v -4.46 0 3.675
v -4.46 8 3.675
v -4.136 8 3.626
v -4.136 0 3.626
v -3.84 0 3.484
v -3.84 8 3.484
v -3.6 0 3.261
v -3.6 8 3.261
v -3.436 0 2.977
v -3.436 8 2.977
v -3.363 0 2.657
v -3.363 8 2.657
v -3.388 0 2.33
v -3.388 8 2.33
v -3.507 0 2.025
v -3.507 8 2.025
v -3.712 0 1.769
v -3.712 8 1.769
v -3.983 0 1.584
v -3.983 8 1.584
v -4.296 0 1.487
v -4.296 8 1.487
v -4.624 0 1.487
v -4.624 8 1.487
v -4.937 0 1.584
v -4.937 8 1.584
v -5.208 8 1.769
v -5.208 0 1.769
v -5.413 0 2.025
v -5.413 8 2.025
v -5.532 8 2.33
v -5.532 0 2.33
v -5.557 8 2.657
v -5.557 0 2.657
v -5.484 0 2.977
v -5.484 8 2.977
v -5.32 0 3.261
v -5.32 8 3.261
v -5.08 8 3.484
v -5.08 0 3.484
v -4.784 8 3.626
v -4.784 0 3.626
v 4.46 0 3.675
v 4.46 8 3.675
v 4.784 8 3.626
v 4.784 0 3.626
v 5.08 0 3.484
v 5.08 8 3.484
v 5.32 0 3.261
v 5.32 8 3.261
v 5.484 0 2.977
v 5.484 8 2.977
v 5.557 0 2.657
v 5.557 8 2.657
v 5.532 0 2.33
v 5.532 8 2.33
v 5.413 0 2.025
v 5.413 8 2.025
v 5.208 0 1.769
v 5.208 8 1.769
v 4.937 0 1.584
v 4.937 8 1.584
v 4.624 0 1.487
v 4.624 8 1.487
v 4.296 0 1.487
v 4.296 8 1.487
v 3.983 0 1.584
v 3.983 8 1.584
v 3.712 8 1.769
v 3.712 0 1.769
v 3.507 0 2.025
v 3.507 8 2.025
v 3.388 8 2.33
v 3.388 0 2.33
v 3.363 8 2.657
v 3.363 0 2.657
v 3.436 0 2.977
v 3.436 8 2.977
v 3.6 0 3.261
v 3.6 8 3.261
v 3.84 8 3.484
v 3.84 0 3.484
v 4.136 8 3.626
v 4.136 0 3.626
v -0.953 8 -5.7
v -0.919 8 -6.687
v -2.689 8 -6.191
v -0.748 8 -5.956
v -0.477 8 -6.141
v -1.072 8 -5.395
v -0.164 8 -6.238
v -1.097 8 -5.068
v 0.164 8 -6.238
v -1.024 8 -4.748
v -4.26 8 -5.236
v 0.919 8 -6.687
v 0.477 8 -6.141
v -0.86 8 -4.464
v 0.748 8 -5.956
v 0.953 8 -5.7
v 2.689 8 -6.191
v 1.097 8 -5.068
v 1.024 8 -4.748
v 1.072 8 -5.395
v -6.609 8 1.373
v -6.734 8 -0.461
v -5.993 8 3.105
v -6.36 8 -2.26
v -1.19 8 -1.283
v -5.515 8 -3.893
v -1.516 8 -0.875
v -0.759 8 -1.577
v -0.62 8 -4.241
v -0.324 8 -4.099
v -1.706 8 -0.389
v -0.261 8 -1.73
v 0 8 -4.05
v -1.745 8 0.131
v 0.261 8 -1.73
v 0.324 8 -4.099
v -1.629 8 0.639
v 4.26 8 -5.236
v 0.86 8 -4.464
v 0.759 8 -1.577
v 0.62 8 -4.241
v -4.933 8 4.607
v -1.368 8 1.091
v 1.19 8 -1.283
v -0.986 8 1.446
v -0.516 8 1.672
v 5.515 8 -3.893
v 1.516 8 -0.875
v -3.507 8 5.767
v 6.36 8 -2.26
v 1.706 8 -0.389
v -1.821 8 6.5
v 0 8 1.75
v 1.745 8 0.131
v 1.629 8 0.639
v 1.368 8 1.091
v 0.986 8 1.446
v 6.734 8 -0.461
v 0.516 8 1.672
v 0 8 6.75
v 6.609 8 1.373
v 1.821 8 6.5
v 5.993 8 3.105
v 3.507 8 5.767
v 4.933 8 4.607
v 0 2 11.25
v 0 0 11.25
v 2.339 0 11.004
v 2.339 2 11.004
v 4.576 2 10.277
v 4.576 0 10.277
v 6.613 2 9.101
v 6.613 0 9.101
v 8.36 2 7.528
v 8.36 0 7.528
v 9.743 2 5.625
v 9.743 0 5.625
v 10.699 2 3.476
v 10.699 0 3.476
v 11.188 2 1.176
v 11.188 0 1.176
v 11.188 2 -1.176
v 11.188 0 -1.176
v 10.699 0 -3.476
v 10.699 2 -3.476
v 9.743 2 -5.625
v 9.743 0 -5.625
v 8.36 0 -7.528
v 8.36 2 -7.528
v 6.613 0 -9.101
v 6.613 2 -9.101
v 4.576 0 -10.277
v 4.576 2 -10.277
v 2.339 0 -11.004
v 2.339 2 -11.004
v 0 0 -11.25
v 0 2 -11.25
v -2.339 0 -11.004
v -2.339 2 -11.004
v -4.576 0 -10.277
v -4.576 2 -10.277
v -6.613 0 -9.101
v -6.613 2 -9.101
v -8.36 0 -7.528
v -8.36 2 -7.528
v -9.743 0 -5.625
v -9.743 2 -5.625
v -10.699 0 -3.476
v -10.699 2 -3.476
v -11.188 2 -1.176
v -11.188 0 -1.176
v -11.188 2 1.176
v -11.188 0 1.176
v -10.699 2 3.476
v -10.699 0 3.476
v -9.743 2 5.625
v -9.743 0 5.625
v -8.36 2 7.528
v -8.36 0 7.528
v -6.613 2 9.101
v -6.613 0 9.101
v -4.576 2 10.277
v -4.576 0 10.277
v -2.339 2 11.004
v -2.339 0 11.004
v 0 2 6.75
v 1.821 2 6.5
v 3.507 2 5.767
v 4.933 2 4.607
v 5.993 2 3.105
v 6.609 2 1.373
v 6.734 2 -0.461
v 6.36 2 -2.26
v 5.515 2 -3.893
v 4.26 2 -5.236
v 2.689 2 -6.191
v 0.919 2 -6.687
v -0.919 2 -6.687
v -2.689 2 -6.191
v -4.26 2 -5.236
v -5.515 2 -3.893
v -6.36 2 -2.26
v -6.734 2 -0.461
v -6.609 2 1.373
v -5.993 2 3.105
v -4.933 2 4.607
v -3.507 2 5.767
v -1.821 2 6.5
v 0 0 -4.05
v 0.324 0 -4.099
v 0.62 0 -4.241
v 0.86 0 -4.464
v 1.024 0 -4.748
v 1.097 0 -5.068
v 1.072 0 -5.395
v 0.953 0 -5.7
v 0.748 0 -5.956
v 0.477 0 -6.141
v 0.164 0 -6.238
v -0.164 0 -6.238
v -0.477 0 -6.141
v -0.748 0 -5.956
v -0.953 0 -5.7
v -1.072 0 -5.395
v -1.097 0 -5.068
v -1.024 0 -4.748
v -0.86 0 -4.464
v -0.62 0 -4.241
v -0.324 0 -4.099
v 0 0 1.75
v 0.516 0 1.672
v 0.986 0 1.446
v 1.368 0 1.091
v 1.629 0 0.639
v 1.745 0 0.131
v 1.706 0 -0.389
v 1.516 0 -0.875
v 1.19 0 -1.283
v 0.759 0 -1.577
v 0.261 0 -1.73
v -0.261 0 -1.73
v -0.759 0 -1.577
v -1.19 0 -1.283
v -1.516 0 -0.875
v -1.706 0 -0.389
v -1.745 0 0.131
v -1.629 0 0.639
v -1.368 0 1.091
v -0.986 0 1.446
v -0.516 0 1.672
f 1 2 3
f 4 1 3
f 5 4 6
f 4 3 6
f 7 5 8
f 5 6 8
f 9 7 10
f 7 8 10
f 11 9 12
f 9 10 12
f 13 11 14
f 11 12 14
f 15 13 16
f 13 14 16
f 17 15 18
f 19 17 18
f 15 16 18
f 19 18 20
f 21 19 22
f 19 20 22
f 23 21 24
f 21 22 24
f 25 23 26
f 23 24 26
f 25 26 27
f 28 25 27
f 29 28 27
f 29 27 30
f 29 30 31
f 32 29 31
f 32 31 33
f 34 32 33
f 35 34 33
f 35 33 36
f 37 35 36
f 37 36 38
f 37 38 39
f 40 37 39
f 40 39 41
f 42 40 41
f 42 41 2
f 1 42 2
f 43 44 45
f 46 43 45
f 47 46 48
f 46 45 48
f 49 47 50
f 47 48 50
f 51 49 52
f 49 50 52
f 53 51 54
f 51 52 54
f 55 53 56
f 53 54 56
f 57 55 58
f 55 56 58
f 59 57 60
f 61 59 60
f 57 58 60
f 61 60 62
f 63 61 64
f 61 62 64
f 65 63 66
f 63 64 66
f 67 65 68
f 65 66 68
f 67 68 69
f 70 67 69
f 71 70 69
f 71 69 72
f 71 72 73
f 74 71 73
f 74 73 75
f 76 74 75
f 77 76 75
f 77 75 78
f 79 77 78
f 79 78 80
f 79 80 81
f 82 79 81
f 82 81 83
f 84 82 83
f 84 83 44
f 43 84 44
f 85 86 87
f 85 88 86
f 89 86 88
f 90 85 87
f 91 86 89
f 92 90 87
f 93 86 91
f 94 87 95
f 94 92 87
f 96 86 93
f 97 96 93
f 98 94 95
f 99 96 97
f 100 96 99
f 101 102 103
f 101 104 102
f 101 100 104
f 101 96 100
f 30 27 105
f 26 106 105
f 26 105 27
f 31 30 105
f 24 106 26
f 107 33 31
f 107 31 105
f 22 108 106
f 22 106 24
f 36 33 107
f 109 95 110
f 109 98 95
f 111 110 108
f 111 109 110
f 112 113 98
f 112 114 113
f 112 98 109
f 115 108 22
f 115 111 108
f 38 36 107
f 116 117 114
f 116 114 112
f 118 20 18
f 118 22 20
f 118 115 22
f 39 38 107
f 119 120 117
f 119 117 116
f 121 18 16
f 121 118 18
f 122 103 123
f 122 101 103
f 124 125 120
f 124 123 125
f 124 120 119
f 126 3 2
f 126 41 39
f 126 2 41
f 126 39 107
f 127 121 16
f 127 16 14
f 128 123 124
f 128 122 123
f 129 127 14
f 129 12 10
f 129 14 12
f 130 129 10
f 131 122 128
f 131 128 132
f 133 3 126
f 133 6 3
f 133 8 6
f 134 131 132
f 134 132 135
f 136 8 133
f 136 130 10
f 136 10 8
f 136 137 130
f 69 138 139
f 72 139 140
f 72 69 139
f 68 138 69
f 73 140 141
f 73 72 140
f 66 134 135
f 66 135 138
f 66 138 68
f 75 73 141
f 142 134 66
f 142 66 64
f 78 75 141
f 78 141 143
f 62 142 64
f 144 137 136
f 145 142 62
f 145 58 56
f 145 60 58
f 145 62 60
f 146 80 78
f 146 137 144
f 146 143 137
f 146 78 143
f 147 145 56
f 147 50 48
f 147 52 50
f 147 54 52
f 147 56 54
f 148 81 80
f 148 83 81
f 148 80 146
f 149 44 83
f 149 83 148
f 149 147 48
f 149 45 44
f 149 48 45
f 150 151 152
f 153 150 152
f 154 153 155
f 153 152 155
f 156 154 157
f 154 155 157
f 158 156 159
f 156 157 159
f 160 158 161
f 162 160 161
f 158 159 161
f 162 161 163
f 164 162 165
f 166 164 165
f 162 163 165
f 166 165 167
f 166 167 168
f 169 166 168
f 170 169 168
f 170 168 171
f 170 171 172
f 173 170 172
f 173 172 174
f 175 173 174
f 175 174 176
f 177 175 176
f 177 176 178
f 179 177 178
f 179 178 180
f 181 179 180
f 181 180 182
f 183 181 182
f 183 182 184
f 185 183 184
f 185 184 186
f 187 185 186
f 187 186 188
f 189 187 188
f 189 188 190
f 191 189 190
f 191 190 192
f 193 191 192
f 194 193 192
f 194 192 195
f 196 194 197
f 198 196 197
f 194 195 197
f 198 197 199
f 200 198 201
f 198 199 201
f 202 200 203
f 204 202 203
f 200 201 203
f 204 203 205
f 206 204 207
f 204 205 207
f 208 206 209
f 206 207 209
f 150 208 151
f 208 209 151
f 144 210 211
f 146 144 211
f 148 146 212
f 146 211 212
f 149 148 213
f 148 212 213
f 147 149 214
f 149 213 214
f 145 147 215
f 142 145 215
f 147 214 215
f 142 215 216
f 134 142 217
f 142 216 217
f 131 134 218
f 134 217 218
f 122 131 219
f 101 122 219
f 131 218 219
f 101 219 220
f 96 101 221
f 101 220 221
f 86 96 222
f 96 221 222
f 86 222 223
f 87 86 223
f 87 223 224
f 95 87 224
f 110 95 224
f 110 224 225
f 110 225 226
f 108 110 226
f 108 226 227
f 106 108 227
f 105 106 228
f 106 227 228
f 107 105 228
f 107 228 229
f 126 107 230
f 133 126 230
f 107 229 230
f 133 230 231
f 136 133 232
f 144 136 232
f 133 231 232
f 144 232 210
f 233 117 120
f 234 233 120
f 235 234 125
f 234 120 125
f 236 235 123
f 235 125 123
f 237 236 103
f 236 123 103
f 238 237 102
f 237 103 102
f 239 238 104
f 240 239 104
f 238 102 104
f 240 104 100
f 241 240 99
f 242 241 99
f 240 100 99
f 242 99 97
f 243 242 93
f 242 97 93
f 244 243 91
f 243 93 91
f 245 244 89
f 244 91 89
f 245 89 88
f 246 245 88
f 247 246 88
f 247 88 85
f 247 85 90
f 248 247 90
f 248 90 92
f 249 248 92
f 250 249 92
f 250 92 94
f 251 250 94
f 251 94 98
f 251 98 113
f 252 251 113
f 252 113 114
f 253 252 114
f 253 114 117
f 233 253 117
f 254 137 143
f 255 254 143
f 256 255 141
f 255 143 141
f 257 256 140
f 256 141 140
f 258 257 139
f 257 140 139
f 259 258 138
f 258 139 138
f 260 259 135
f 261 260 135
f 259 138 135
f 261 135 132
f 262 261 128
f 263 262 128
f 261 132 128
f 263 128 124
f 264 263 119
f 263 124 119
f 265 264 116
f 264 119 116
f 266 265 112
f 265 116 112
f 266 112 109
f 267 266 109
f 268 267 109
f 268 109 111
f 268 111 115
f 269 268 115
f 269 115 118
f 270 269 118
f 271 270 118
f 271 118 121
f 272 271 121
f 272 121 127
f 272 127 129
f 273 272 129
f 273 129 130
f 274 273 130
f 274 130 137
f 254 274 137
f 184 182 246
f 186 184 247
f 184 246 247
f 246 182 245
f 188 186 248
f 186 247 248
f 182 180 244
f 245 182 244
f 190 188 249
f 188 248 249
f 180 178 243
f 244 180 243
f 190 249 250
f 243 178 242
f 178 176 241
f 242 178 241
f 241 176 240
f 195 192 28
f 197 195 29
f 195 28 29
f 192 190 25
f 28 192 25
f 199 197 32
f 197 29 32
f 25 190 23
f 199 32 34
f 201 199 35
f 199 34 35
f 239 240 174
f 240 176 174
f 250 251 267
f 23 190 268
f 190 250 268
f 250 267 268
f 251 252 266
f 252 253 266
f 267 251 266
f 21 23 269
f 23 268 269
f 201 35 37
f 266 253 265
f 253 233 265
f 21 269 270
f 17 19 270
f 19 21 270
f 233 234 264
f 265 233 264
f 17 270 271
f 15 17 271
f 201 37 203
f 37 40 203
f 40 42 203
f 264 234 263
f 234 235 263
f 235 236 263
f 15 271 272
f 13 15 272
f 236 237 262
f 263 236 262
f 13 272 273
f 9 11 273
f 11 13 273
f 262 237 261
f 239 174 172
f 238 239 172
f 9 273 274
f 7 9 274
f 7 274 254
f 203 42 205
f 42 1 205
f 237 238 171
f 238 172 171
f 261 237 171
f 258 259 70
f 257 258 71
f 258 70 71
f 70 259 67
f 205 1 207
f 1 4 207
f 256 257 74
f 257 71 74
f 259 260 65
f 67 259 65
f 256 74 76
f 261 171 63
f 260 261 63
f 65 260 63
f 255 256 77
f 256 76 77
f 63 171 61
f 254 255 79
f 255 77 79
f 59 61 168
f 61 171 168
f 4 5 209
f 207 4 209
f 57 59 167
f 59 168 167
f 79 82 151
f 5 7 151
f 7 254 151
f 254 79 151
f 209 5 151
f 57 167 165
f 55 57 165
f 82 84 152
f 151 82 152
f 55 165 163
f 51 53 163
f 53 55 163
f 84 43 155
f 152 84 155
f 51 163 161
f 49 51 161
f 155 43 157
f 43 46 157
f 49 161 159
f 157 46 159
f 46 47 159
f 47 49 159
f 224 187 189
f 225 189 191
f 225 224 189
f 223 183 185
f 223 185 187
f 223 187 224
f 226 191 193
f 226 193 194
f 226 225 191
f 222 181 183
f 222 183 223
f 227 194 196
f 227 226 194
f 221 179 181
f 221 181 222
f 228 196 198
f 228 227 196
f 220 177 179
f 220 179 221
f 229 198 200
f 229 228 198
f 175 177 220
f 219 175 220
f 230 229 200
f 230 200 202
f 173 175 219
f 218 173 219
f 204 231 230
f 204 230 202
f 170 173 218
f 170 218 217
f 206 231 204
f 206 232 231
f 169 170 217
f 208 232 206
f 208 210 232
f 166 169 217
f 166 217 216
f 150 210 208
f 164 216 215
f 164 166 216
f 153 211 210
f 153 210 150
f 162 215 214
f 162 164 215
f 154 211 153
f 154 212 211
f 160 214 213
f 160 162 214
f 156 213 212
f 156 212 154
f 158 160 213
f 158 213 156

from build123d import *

# Parameters (mm, degrees)
SKETCH_1_R          = 11.25
EXTRUDE_1_DEPTH     = 8
CUT_EXTRUDE_START   = -6
SKETCH_3_R          = 11.25
SKETCH_3_R_2        = 6.75
CUT_EXTRUDE_1_DEPTH = 6
SKETCH_4_R          = 1.75
SKETCH_4_R_2        = 1.1
CUT_EXTRUDE_2_DEPTH = 18.808003819


with BuildPart() as part:
    # 草图1 → 凸台-拉伸1 (new body)
    with BuildSketch(Plane(origin=(0, 0, 0), x_dir=(1, 0, 0), z_dir=(0, 1, 0))):
        with Locations(Location((0, 0, 0), (0, 0, 270))):
            Circle(SKETCH_1_R)
    extrude(amount=EXTRUDE_1_DEPTH)

    # 草图3 → 切除-拉伸1 (cut)
    with BuildSketch(Plane(origin=(0, 8, 0), x_dir=(1, 0, 0), z_dir=(0, 1, 0)).offset(CUT_EXTRUDE_START)):
        with Locations(Location((0, 0, 0), (0, 0, 270))):
            Circle(SKETCH_3_R)
        with Locations(Location((0, 0, 0), (0, 0, 270))):
            Circle(SKETCH_3_R_2, mode=Mode.SUBTRACT)
    extrude(amount=CUT_EXTRUDE_1_DEPTH, mode=Mode.SUBTRACT)

    # 草图4 → 切除-拉伸2 (cut, through all)
    with BuildSketch(Plane(origin=(0, 8, 0), x_dir=(1, 0, 0), z_dir=(0, 1, 0))):
        with Locations(Location((0, 0, 0), (0, 0, 270))):
            Circle(SKETCH_4_R)
        with Locations(Location((0, 5.15, 0), (0, 0, 270))):
            Circle(SKETCH_4_R_2)
        with Locations(Location((4.460030829, -2.575, 0), (0, 0, 270))):
            Circle(SKETCH_4_R_2)
        with Locations(Location((-4.460030829, -2.575, 0), (0, 0, 270))):
            Circle(SKETCH_4_R_2)
    extrude(amount=-CUT_EXTRUDE_2_DEPTH, mode=Mode.SUBTRACT)


solid = part.part
